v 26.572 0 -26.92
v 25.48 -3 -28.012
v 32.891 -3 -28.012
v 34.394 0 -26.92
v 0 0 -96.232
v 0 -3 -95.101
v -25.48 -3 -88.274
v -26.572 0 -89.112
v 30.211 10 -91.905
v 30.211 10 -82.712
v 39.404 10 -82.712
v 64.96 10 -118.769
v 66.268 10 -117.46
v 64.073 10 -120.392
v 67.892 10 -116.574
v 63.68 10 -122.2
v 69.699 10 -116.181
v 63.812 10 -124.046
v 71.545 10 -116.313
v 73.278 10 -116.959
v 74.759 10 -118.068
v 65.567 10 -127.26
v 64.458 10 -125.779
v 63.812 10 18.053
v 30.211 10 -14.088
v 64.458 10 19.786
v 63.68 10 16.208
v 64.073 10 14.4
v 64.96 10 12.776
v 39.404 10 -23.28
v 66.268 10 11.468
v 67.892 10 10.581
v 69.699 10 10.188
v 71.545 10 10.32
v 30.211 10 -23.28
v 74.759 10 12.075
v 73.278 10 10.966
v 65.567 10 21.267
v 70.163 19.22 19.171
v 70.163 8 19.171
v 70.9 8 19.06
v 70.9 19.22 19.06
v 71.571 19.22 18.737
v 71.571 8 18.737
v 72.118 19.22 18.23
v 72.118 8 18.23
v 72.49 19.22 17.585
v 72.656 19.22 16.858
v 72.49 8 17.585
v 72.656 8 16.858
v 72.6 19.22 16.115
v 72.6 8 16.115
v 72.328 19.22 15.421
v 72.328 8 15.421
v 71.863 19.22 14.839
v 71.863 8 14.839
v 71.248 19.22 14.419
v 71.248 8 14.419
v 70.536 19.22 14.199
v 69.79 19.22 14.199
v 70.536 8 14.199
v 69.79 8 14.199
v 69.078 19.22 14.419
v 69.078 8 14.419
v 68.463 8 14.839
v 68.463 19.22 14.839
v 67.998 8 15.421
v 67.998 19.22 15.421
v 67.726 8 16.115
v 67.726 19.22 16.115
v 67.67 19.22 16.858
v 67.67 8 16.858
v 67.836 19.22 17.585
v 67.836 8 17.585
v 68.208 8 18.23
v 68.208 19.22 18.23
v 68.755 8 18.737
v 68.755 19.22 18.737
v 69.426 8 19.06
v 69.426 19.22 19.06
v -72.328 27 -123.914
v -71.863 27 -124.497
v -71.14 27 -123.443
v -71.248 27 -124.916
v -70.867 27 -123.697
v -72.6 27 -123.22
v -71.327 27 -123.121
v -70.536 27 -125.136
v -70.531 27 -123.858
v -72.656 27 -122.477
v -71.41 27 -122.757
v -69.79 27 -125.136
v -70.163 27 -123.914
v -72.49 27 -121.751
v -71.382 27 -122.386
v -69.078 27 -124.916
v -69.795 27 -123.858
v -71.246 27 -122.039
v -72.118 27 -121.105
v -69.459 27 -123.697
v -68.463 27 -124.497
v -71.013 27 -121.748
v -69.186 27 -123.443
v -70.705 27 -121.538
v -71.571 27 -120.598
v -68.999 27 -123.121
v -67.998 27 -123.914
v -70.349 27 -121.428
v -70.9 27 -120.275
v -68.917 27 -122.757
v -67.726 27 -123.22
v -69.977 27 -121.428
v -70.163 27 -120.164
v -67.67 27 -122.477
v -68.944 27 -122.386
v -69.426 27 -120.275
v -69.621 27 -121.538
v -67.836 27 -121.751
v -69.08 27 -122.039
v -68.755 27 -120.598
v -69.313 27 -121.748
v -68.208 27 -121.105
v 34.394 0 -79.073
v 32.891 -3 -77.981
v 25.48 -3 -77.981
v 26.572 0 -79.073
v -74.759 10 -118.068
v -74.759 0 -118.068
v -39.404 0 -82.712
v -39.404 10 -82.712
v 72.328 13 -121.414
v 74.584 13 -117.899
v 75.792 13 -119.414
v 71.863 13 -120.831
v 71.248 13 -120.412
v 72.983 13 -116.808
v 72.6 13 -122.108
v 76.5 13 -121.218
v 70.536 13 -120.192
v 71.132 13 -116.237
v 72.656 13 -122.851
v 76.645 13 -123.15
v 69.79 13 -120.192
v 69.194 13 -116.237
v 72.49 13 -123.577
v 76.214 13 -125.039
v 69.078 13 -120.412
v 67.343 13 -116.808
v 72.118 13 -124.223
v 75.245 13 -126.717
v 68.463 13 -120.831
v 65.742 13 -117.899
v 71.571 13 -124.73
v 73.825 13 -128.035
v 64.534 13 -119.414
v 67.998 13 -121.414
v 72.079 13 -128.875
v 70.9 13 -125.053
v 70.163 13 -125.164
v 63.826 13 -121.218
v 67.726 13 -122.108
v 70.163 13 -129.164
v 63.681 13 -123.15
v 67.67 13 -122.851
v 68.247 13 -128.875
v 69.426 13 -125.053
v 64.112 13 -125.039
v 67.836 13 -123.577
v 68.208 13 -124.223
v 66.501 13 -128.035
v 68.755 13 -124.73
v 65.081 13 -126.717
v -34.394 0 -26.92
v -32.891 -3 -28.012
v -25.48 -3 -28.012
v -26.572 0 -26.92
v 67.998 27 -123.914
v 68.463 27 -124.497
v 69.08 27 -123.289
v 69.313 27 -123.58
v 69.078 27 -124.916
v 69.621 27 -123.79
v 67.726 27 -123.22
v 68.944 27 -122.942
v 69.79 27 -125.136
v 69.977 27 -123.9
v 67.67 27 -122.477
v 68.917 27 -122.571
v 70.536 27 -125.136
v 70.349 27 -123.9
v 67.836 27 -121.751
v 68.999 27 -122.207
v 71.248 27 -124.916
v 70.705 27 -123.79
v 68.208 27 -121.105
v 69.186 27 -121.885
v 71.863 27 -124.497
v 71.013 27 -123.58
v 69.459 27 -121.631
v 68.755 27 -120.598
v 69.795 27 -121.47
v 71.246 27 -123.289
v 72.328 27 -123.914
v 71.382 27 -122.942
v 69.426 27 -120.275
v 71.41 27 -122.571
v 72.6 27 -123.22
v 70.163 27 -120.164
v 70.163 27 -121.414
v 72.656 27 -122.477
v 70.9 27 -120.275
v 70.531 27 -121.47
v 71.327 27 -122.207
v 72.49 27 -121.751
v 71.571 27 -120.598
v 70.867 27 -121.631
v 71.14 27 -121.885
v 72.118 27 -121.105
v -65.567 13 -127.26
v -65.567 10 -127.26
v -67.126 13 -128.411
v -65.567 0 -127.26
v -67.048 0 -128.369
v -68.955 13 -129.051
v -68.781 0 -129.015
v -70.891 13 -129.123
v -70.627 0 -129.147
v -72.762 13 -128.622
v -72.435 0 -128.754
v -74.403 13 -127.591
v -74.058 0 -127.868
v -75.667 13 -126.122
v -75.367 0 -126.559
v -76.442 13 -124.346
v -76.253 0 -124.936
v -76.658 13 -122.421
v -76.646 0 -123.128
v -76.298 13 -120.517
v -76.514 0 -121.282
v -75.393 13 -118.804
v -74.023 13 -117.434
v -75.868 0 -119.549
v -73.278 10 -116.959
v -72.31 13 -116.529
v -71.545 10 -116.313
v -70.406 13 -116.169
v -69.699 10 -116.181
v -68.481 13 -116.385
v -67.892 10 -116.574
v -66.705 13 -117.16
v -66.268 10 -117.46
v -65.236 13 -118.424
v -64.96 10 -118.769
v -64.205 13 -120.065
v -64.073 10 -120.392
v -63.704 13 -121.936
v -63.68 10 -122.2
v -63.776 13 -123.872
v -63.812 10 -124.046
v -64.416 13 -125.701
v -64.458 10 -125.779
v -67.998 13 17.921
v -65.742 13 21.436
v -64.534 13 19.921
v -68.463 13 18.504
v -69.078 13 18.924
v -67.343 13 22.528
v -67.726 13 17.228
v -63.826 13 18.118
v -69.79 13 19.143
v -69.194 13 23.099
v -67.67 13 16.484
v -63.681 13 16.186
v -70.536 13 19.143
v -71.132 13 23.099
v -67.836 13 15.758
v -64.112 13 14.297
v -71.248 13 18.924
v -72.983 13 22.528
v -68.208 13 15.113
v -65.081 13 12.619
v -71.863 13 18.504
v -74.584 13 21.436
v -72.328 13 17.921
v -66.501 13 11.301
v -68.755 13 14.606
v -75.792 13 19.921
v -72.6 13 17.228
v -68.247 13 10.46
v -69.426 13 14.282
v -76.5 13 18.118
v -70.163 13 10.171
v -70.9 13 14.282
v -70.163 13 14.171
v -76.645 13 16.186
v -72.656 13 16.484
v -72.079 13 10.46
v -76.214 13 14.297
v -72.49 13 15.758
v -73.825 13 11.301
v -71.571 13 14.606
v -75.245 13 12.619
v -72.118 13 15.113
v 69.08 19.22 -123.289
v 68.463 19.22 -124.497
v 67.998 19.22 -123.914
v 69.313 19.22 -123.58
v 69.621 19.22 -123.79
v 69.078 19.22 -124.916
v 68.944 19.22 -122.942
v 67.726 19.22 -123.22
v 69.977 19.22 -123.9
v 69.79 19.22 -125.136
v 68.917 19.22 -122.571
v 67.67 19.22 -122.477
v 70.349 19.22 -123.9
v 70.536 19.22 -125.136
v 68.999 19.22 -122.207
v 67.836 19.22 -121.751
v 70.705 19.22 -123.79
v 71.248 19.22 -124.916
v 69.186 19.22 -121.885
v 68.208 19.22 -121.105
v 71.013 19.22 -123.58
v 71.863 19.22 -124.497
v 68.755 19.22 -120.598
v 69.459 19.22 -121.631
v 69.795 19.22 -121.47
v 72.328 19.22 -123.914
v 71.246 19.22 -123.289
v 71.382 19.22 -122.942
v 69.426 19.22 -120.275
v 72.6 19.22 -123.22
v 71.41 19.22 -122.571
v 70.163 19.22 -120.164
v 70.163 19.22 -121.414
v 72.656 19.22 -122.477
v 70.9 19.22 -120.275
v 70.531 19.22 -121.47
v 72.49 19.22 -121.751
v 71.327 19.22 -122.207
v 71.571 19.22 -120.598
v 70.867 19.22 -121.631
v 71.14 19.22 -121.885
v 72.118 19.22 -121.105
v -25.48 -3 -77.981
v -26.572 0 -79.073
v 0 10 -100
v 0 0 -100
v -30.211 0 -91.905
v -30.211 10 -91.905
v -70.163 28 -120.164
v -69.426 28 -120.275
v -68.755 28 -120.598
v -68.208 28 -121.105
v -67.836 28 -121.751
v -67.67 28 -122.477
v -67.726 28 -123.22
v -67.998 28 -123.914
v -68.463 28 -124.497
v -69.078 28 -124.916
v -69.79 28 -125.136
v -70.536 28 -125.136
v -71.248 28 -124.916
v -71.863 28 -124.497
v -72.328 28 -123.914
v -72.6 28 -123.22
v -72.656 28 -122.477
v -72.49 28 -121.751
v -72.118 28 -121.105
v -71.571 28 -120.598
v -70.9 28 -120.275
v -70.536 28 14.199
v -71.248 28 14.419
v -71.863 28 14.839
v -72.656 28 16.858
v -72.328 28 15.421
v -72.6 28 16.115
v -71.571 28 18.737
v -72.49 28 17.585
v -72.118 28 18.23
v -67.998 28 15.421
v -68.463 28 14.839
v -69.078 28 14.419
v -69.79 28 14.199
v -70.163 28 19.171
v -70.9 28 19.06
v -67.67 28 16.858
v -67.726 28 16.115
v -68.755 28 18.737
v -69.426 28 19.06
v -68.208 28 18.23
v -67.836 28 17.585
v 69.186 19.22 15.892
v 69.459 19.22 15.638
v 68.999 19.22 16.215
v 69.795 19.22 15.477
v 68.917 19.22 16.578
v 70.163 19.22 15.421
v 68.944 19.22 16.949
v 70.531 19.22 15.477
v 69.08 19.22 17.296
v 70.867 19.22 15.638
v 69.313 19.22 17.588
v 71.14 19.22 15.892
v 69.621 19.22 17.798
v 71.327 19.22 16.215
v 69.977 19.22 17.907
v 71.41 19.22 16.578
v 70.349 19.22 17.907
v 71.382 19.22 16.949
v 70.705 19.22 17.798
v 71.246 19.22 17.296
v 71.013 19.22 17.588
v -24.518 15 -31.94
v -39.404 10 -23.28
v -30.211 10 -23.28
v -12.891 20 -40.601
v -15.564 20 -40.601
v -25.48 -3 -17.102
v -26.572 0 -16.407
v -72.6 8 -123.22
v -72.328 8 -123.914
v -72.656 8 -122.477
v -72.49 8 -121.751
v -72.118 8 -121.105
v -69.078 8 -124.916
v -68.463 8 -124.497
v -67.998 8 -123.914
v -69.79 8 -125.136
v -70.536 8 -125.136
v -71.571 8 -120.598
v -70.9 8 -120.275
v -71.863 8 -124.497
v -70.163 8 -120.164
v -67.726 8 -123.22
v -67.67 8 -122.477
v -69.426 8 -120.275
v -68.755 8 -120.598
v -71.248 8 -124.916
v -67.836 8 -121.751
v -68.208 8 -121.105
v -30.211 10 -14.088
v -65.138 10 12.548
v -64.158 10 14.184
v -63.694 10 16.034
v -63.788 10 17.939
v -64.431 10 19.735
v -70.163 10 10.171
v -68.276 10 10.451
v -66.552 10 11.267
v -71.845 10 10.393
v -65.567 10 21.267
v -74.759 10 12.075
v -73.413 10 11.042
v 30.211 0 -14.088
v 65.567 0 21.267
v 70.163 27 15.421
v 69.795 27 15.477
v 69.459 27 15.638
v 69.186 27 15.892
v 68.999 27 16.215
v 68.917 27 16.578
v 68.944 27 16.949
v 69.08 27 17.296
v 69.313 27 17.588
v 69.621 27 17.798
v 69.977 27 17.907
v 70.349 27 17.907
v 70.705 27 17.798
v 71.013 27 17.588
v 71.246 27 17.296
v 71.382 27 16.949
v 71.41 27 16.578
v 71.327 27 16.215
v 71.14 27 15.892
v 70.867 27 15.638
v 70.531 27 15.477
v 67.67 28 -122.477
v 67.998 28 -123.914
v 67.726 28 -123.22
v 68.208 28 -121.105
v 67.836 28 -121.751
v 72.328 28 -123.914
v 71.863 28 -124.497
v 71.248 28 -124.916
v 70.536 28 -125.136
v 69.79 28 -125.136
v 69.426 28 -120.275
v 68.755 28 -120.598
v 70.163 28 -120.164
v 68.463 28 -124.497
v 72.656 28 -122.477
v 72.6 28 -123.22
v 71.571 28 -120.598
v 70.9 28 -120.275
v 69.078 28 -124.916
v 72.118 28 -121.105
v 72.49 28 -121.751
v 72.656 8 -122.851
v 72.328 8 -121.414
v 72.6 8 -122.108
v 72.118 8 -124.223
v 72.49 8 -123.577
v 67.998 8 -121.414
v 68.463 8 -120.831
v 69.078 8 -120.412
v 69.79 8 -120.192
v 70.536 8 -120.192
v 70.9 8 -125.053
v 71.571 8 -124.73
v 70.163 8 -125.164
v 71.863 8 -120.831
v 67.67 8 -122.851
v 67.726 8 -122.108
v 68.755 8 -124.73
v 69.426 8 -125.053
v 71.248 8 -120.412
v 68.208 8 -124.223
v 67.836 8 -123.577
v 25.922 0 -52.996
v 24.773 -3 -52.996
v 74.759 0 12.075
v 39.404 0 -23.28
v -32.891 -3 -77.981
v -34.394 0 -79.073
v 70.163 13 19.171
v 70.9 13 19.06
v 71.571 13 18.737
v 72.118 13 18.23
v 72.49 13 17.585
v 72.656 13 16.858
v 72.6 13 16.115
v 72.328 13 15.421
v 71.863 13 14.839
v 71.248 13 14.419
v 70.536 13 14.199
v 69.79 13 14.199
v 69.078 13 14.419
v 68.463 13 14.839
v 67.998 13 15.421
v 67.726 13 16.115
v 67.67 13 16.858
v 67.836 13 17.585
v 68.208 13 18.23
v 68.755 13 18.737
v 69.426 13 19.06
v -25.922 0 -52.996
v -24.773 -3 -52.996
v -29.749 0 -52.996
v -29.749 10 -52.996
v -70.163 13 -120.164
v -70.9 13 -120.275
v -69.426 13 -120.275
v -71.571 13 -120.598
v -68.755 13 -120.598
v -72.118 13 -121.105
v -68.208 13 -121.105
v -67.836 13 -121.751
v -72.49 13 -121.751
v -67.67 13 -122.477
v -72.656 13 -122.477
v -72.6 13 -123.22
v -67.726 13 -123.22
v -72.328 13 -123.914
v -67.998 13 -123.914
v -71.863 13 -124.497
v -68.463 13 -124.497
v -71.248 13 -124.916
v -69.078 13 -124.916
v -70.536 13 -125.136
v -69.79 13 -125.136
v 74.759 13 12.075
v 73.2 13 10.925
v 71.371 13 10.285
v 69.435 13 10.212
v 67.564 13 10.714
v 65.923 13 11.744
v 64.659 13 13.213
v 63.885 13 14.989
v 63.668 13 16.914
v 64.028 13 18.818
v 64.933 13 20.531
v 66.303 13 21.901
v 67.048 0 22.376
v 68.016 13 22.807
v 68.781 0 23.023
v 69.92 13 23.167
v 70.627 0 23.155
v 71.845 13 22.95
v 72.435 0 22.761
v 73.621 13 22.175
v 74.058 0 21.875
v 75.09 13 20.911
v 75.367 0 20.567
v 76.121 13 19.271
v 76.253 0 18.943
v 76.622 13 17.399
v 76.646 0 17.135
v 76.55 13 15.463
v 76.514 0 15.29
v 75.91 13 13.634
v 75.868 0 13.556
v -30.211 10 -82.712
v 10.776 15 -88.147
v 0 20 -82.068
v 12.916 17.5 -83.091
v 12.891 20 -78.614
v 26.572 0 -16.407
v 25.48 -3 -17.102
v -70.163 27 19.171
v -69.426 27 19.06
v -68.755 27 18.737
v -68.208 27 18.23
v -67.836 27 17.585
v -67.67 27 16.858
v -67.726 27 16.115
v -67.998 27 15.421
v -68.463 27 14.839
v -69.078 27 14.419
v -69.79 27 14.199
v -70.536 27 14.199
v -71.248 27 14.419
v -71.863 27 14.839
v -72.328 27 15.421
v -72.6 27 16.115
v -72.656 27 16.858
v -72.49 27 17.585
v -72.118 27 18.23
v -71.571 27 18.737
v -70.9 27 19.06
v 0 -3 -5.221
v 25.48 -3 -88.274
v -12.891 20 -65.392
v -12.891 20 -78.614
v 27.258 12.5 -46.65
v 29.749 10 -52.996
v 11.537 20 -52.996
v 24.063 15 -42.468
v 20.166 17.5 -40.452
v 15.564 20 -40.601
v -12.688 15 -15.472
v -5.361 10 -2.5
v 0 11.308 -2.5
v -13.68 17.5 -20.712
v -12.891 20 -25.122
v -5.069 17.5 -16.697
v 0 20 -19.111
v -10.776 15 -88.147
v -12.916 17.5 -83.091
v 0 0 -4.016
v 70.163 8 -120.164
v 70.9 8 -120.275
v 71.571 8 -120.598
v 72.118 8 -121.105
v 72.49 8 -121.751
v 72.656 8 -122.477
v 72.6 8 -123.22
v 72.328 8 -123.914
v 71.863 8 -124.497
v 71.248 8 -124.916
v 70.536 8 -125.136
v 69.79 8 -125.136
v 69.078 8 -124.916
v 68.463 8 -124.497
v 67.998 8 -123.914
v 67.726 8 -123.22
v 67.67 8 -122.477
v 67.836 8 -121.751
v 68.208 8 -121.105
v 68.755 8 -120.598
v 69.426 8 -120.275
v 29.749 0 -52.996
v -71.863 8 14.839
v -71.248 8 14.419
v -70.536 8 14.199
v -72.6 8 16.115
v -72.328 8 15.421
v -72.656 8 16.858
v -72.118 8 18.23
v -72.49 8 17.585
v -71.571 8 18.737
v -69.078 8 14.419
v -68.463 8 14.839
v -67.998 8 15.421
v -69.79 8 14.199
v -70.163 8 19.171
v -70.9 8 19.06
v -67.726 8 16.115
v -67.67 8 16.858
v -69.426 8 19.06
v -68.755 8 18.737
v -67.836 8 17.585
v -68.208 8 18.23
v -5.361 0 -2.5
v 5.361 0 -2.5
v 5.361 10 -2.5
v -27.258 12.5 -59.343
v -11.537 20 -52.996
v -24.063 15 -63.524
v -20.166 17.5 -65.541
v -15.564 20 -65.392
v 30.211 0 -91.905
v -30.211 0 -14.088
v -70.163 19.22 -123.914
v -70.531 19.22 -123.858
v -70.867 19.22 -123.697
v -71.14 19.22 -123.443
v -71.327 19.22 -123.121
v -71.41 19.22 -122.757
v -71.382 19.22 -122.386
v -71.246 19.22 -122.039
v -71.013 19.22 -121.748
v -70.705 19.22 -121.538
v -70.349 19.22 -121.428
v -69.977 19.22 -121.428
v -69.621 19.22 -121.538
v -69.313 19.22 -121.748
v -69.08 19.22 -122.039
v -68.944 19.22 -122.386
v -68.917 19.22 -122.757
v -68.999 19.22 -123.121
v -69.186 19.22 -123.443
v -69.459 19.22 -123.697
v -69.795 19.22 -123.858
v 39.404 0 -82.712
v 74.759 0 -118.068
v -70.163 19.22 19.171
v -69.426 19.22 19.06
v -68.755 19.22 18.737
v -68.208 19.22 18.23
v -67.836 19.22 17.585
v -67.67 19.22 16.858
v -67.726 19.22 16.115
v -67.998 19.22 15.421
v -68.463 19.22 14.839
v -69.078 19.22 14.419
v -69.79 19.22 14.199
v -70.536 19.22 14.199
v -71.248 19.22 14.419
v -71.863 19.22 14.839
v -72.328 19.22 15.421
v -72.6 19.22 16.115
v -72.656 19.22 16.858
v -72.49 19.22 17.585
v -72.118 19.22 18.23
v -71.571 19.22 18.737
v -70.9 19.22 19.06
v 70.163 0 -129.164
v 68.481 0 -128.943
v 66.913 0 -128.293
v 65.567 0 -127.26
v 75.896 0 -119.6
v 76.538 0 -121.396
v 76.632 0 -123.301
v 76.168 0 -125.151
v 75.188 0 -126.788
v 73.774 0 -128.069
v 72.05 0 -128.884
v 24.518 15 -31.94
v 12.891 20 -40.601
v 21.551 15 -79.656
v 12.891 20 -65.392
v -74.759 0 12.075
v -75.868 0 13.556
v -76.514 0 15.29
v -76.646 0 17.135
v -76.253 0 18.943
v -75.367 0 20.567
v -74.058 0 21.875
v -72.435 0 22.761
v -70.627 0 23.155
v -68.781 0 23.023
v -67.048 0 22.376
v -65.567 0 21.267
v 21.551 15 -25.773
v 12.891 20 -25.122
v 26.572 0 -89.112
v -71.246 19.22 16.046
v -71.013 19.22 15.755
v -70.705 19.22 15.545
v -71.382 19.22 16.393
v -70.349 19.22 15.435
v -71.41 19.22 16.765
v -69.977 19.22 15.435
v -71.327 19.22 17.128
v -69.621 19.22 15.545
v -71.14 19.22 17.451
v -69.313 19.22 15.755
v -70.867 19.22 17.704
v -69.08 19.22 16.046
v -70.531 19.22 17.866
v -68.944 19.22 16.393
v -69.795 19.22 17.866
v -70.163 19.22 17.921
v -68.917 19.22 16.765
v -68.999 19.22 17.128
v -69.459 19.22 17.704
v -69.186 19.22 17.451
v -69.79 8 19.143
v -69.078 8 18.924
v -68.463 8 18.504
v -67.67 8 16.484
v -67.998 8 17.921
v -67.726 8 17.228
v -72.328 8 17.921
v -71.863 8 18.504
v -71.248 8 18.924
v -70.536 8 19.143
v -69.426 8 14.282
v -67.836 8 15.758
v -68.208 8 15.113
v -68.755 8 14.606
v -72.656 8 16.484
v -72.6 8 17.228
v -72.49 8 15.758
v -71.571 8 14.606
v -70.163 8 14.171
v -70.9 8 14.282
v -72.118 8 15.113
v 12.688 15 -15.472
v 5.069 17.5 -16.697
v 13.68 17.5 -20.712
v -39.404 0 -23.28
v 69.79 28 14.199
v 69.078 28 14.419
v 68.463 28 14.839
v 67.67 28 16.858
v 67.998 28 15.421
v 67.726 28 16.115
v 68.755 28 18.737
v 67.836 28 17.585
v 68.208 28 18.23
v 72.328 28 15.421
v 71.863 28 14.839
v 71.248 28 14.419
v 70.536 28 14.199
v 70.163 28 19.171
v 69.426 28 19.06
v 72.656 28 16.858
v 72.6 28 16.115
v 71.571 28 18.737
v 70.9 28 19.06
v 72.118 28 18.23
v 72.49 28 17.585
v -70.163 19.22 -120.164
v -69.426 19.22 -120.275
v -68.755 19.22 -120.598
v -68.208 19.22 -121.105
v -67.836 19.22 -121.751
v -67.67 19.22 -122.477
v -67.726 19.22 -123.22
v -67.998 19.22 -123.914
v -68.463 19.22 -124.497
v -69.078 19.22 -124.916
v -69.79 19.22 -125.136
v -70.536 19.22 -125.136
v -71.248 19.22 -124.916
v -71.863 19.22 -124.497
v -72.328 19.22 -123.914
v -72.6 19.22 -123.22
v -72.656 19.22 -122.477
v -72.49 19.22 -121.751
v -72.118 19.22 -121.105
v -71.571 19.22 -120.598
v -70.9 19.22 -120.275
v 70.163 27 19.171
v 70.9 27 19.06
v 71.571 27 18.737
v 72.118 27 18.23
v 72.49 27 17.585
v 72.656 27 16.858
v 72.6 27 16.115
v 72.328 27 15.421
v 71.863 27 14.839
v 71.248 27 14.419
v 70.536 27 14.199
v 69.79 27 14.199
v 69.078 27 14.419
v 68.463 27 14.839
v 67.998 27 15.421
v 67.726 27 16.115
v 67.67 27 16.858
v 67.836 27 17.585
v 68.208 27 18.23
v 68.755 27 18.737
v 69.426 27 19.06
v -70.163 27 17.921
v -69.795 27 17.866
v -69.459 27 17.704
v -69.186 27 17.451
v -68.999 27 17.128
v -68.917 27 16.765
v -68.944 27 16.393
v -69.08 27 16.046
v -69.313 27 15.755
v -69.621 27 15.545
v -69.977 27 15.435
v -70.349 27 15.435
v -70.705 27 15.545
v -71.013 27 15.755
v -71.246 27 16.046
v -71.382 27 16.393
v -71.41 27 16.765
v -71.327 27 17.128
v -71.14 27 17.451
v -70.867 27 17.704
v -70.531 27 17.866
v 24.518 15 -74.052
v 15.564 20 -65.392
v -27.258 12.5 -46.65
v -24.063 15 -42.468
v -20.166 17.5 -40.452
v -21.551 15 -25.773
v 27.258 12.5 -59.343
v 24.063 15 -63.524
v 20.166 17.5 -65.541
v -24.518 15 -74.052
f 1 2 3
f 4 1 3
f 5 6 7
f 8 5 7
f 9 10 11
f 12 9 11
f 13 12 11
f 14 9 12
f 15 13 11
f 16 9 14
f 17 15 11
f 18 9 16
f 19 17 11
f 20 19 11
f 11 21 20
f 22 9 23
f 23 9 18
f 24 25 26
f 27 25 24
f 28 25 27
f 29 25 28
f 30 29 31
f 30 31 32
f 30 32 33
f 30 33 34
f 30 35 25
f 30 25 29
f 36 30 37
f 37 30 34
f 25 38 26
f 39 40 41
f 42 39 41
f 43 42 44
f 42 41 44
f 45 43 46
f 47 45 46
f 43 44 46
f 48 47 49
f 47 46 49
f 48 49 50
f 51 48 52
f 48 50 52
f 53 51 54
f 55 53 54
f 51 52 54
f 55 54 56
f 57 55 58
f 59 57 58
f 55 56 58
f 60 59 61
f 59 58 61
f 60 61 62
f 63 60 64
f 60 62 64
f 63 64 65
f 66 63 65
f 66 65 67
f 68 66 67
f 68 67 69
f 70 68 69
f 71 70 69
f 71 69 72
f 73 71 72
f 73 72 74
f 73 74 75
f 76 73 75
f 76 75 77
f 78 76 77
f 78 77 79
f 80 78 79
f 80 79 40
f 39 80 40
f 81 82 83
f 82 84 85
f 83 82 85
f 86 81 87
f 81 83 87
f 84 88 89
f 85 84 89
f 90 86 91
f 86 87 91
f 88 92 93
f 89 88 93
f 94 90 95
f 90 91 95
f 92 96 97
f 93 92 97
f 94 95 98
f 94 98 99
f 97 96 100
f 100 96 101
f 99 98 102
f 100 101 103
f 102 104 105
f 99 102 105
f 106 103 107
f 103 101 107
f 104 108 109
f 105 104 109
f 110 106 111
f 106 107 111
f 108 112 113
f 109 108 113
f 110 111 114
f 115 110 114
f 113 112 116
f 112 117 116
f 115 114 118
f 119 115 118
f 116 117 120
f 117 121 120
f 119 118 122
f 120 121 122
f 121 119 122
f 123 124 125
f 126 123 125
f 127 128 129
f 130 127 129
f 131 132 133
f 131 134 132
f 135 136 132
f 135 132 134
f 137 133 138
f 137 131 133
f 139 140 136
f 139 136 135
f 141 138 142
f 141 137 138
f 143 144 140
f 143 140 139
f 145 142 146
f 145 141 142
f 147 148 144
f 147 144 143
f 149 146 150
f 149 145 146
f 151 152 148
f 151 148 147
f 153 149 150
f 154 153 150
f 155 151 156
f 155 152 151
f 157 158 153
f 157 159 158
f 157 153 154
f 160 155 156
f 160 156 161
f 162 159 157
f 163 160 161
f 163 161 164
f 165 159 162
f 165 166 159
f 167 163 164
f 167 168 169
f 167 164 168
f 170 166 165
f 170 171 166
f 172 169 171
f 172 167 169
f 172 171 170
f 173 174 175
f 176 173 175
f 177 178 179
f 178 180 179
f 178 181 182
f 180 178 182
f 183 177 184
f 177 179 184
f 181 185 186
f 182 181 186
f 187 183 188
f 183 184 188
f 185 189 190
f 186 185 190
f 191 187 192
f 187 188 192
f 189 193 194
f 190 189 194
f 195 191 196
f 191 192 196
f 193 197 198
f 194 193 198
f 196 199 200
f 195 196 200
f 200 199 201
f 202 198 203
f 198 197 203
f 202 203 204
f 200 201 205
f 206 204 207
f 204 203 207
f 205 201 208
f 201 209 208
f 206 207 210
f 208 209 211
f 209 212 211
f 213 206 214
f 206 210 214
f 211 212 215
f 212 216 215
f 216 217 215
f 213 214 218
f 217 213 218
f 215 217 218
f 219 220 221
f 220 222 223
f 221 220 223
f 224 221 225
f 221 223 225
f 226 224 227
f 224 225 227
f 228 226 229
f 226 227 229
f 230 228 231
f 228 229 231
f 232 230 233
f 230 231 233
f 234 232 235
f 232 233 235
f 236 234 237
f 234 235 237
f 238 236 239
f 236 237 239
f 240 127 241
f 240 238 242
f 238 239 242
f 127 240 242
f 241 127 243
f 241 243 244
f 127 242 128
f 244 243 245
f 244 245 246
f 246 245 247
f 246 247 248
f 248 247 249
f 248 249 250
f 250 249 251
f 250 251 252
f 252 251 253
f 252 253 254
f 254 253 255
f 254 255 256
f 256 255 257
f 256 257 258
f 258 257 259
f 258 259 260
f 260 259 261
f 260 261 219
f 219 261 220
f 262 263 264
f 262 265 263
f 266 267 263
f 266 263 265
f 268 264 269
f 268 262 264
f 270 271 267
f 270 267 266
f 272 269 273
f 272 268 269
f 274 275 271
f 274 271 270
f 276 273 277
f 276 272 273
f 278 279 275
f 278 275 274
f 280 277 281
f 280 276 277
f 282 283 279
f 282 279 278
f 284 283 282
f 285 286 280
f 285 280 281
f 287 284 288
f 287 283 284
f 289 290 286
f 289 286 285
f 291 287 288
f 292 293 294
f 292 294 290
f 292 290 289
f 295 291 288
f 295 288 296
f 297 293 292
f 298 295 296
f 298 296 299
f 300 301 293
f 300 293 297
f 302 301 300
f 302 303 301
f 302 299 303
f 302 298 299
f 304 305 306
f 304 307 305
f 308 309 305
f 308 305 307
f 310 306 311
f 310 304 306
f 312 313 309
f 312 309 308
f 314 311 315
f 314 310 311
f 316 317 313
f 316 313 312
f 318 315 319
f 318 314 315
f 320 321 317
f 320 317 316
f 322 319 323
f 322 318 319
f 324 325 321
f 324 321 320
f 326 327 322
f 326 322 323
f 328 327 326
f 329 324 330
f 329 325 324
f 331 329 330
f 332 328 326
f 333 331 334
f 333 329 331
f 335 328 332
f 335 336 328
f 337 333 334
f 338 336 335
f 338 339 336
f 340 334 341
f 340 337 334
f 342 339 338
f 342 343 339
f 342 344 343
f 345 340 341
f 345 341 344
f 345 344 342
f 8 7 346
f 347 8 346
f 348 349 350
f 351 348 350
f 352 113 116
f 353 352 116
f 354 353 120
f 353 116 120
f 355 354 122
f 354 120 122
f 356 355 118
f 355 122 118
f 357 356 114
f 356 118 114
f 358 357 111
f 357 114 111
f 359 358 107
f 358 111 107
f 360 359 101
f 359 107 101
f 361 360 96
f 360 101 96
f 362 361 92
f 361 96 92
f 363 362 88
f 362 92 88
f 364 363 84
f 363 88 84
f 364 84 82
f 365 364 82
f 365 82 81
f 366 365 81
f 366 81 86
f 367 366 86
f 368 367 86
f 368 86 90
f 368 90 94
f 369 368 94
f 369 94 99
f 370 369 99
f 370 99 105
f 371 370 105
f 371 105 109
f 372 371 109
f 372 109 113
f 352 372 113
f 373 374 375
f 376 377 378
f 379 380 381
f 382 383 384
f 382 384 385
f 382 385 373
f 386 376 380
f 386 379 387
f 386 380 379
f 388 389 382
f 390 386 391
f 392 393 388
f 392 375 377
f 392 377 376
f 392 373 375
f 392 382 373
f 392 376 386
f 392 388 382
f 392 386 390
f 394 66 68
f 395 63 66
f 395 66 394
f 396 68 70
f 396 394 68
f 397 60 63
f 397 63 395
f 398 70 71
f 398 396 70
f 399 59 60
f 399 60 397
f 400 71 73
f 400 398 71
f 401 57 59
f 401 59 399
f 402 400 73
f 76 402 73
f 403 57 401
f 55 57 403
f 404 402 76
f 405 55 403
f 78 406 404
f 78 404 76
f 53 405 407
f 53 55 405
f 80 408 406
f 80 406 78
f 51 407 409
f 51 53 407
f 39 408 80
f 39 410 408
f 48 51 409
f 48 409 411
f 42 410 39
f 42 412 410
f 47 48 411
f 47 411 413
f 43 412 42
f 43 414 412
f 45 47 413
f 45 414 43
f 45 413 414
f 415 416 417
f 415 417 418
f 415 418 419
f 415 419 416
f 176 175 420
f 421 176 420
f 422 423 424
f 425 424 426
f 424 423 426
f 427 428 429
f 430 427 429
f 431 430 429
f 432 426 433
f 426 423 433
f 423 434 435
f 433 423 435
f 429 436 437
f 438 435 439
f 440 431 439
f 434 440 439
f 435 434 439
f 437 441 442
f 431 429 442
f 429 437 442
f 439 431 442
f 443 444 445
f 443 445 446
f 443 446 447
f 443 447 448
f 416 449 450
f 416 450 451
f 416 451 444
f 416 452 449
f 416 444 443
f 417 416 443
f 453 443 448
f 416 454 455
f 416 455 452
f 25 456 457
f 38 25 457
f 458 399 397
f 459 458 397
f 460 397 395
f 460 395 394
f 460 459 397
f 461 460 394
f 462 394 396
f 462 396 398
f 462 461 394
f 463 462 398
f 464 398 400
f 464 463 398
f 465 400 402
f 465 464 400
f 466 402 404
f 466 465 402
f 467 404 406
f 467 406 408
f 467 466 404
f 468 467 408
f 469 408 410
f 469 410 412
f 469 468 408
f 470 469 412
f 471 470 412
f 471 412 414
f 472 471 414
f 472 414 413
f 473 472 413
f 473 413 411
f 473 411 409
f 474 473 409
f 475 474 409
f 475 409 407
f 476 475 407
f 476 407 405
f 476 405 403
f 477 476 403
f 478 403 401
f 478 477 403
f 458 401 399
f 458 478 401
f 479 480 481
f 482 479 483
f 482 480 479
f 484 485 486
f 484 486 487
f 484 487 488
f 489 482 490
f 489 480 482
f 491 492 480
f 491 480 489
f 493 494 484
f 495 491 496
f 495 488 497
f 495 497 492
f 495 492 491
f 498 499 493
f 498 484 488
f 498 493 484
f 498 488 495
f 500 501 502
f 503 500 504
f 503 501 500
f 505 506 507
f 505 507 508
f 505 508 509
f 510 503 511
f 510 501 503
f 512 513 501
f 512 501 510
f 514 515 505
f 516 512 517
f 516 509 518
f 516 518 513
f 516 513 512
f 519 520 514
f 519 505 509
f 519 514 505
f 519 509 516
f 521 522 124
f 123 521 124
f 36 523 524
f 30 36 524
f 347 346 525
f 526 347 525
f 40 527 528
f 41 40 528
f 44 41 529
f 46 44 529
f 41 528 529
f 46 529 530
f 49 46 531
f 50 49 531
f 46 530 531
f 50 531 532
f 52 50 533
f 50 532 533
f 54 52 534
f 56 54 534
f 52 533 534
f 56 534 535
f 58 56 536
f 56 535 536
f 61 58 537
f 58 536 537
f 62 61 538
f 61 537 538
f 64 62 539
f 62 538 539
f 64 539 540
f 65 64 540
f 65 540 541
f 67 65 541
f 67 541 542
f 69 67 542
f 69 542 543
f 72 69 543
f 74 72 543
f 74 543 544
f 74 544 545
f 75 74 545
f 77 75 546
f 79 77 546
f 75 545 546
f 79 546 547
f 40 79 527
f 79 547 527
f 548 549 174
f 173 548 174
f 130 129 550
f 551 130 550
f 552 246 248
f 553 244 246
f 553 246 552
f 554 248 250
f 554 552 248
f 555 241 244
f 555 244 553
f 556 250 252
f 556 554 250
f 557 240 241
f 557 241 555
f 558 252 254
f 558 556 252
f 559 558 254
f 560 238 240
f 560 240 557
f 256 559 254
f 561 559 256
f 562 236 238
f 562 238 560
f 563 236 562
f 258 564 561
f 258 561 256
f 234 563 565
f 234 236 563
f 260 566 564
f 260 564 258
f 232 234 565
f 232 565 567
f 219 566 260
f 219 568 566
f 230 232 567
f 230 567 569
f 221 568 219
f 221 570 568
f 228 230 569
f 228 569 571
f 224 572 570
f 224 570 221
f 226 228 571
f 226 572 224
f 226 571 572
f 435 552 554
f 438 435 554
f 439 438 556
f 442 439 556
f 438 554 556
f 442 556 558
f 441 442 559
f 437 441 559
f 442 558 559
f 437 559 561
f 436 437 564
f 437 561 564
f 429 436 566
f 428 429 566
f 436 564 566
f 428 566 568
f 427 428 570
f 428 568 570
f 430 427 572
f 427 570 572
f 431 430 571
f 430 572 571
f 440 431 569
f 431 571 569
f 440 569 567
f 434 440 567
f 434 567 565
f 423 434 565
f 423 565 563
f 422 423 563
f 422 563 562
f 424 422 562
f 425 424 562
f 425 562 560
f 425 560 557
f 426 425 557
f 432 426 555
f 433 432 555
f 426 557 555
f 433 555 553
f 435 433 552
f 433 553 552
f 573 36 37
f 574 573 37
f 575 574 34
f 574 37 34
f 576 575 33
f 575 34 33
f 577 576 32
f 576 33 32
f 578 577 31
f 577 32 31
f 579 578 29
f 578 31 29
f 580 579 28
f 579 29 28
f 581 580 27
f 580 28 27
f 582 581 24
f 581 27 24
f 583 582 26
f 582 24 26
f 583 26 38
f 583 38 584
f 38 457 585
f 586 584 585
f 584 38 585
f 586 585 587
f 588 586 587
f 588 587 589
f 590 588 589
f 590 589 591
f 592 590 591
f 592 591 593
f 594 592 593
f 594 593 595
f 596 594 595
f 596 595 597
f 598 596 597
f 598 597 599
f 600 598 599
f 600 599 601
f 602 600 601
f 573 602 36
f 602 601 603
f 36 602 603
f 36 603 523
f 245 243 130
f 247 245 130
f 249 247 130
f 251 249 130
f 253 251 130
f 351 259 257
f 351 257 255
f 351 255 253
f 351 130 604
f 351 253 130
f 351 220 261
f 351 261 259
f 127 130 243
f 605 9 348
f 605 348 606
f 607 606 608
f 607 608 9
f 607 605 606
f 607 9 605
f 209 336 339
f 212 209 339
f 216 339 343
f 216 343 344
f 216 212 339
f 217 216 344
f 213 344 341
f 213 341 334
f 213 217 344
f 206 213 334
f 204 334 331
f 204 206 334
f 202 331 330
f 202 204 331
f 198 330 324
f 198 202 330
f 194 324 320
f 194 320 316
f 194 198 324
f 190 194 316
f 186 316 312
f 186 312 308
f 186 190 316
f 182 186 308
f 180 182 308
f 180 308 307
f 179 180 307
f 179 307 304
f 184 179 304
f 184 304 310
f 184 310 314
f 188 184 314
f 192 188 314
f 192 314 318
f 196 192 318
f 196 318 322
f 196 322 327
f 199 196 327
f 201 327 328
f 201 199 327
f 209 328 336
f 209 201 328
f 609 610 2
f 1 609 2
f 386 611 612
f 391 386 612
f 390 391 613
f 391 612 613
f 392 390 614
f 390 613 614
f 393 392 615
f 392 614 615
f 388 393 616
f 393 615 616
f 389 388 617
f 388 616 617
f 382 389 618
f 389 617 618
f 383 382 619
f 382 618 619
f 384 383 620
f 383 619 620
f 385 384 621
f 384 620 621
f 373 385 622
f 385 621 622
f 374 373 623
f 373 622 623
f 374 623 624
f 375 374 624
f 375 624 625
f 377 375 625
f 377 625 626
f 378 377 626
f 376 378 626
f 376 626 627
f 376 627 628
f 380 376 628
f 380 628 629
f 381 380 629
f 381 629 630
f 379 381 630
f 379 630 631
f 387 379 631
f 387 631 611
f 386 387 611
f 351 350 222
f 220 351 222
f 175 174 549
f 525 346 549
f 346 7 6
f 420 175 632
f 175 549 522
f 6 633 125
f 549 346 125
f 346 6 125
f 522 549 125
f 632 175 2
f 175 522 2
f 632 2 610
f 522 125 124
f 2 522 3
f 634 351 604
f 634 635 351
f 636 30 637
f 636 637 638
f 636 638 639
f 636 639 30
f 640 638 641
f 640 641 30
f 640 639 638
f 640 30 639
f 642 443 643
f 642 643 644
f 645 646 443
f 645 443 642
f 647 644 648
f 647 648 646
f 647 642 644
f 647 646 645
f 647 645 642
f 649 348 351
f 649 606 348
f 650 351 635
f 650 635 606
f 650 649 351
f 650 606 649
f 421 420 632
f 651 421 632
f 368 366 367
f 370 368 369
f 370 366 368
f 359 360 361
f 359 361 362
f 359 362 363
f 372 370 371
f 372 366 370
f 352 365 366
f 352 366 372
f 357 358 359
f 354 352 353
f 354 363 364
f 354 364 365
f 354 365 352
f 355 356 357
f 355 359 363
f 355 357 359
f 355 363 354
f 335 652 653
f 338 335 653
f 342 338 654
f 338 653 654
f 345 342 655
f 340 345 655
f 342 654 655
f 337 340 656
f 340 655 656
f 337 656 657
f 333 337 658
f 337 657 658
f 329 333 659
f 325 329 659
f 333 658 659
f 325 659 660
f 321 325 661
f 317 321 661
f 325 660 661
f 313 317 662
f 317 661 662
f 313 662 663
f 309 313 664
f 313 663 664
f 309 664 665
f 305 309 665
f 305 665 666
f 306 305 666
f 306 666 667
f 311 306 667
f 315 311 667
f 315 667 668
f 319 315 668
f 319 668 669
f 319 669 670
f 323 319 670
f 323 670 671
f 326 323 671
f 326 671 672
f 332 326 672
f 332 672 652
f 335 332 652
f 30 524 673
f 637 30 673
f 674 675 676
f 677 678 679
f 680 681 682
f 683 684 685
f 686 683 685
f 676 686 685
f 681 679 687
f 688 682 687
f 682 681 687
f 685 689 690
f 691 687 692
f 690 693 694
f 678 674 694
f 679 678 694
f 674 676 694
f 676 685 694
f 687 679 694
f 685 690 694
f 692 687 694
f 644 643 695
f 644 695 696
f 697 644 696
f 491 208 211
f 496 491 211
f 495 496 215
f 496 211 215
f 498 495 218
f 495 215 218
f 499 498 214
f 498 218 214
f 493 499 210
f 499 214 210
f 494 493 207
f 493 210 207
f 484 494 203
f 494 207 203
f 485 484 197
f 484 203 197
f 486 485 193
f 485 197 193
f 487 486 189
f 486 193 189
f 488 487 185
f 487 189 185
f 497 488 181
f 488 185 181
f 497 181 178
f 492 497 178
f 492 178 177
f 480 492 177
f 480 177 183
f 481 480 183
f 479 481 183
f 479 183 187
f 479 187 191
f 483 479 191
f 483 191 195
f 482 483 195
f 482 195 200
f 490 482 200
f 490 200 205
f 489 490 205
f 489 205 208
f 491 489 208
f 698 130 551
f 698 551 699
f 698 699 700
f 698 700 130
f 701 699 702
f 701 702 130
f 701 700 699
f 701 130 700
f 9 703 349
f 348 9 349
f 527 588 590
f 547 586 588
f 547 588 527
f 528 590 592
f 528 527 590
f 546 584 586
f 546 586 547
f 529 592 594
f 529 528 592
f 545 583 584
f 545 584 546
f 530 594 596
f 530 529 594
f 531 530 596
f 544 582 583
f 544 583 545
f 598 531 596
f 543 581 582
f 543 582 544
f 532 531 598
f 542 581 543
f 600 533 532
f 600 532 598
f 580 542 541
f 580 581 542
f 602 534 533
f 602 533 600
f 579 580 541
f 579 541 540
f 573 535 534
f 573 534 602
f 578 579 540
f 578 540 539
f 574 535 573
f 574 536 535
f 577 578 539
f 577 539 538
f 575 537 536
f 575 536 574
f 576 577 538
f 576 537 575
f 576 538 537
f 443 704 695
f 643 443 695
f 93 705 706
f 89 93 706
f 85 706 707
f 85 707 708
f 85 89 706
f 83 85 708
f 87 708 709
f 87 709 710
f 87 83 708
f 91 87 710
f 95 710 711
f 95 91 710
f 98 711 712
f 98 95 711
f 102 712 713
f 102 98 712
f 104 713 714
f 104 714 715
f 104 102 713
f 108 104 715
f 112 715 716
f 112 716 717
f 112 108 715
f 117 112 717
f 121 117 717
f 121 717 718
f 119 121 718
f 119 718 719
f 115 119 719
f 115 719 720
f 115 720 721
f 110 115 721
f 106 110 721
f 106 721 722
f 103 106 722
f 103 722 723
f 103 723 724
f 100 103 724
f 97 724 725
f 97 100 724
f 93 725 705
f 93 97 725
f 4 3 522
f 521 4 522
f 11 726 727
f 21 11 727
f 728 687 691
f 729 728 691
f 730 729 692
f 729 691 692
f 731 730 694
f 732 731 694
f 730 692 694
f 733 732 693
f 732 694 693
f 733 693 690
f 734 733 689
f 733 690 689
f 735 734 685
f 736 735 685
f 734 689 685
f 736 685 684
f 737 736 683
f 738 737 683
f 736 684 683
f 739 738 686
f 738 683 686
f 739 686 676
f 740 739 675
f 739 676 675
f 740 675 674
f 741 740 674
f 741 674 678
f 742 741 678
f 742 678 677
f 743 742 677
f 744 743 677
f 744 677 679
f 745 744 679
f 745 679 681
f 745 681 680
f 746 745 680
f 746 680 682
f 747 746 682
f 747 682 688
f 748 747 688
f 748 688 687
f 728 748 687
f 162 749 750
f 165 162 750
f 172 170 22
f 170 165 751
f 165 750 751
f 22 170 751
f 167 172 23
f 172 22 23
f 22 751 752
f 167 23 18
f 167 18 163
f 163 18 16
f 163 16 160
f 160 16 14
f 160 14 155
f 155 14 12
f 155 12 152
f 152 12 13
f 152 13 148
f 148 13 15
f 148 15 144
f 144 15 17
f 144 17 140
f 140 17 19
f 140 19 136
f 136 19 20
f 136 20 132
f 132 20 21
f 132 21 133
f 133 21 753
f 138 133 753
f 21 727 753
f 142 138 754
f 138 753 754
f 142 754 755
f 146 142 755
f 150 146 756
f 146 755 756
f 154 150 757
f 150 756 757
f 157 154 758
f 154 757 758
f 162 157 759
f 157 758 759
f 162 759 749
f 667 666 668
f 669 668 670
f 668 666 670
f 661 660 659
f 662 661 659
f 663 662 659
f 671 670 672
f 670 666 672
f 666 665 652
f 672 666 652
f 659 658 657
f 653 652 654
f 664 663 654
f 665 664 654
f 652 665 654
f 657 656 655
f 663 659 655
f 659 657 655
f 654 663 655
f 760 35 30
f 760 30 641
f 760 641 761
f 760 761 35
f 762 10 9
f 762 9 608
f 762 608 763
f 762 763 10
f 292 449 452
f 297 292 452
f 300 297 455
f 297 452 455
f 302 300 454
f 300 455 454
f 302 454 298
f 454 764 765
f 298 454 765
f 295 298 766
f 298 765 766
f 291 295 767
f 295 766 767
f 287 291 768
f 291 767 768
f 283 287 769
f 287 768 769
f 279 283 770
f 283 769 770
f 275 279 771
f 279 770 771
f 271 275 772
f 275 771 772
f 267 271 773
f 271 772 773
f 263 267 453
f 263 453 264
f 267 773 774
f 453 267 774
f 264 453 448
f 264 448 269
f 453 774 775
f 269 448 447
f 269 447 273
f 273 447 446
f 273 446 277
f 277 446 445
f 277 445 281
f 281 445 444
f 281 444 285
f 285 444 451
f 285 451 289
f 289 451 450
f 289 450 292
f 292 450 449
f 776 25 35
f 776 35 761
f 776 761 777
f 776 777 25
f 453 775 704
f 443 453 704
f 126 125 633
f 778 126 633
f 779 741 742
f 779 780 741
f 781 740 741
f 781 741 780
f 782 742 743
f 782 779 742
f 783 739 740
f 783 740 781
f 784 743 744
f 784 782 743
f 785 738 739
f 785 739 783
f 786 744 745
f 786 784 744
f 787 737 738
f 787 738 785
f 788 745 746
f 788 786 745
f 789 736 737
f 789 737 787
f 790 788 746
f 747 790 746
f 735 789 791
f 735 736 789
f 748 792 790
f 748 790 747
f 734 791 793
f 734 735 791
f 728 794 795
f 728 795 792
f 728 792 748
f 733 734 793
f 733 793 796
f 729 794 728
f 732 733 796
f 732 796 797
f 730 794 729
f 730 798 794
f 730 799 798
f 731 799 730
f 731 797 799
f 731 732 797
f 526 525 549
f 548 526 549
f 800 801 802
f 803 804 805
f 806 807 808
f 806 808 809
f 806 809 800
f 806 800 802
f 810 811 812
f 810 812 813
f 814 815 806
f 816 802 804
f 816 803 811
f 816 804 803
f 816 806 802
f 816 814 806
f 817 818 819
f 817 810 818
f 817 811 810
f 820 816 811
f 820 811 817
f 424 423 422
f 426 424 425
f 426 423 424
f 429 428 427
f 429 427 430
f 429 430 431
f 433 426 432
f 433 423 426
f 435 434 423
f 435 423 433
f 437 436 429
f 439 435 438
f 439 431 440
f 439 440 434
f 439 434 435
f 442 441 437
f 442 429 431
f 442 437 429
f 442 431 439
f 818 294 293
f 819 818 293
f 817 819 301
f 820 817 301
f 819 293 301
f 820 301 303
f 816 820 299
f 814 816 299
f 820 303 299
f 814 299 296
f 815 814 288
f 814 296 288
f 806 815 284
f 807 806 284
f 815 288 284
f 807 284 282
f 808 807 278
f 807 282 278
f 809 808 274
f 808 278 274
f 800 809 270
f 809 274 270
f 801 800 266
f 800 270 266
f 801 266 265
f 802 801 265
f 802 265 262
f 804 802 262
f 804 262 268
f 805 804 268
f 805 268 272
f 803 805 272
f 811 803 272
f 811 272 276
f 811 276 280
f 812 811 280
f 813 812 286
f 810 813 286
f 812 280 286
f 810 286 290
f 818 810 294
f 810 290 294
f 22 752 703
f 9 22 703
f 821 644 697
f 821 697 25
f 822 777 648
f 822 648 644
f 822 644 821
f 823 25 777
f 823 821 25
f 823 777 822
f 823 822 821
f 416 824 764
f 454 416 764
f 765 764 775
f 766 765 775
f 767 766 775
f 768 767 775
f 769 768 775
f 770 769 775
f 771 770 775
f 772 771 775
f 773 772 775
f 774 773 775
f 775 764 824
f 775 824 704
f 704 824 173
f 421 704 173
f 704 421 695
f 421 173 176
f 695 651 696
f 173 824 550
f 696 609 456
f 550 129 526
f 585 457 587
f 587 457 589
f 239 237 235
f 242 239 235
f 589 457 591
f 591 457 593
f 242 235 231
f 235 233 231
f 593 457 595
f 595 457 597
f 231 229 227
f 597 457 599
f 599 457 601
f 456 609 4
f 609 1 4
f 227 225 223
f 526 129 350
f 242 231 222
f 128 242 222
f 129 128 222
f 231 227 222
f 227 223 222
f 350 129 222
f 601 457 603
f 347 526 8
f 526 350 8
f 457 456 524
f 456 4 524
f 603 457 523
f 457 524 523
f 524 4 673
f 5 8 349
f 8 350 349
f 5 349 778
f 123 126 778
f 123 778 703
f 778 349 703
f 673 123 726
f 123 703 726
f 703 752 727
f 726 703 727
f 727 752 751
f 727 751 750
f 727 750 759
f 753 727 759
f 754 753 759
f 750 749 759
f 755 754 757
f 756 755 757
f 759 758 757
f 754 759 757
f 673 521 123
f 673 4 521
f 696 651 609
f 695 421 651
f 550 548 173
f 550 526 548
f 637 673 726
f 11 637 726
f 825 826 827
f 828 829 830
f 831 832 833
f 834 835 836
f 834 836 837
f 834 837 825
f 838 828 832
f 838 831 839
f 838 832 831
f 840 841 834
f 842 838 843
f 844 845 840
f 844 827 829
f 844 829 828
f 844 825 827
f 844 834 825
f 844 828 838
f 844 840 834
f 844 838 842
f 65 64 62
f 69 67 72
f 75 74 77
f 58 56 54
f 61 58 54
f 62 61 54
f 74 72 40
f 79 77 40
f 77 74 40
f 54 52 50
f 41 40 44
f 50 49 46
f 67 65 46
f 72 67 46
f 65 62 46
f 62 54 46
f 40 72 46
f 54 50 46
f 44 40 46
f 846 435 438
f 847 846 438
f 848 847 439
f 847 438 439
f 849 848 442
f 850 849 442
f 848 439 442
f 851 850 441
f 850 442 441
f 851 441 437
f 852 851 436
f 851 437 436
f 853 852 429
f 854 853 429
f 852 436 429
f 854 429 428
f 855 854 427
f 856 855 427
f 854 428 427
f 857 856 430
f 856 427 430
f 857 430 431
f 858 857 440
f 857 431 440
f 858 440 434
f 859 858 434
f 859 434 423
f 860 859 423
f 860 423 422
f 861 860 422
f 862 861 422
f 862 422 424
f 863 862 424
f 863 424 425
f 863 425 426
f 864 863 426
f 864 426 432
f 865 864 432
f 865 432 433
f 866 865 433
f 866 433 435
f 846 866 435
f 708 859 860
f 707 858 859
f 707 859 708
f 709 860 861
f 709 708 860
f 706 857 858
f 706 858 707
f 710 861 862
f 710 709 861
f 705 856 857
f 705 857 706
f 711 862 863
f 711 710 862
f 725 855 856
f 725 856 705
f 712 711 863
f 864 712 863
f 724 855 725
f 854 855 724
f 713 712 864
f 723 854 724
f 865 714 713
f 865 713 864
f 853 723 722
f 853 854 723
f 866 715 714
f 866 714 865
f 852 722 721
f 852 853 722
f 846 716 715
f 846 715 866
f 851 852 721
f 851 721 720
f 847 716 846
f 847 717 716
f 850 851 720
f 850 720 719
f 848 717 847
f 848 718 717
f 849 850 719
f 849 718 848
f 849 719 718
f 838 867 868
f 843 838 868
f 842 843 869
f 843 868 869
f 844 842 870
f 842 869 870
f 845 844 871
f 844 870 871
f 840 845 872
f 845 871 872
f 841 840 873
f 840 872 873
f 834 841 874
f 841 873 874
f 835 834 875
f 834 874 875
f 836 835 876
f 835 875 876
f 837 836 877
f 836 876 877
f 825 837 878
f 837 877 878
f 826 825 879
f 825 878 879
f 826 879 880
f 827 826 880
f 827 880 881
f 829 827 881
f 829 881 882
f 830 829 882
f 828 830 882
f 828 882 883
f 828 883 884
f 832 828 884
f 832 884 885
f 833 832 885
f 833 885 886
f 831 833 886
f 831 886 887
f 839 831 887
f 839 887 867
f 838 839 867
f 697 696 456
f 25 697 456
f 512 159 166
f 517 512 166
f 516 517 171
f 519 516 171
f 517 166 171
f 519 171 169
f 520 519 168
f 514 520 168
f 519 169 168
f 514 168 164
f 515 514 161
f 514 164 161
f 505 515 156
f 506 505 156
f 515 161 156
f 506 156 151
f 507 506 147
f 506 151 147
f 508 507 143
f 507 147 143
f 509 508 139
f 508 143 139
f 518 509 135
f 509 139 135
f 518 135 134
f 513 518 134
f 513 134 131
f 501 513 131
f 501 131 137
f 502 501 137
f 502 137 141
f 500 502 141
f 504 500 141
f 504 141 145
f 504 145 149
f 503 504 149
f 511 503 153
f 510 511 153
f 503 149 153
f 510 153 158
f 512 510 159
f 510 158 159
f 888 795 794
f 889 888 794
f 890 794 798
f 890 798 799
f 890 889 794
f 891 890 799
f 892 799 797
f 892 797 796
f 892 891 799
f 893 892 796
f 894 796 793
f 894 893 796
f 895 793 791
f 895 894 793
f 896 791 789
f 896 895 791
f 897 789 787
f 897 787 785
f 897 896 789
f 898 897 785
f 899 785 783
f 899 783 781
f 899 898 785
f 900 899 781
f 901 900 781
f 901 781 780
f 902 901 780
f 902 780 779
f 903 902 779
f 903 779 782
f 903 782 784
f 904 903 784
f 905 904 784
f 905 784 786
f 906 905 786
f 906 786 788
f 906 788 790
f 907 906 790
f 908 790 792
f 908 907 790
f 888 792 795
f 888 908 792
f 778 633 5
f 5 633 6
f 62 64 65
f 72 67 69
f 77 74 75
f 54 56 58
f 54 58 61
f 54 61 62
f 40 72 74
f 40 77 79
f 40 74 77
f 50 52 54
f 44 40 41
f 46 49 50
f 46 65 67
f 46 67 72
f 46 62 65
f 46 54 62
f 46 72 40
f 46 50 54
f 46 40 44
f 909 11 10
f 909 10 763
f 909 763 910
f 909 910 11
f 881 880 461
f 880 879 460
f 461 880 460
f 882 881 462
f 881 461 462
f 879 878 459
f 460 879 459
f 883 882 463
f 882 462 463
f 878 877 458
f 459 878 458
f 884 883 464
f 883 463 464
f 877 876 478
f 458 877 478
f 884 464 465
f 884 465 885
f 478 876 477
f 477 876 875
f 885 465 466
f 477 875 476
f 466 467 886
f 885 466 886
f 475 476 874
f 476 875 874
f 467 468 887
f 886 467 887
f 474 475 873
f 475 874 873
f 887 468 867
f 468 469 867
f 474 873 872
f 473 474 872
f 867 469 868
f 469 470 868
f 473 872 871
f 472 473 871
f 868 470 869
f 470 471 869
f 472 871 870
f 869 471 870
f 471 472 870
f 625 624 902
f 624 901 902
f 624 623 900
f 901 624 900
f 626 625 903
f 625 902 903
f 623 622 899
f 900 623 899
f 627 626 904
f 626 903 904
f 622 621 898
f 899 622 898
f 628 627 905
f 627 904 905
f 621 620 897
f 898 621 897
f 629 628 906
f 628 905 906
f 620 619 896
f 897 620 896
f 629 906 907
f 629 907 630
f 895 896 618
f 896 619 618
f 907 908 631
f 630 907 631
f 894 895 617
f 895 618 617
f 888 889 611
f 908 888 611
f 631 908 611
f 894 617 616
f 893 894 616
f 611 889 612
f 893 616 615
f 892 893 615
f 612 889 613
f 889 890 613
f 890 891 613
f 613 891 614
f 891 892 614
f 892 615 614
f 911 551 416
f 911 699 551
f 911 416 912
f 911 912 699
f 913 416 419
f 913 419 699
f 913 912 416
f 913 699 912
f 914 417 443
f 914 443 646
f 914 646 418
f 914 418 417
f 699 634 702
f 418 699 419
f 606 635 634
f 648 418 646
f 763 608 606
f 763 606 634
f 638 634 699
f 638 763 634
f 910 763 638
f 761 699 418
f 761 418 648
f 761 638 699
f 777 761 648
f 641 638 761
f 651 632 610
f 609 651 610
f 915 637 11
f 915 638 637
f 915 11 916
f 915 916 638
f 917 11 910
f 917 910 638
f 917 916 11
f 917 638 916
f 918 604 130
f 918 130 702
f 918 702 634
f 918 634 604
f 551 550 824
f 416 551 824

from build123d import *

# Parameters (mm, degrees)
SALIENTE_EXTRUIR1_DEPTH           = 10
SALIENTE_EXTRUIR2_DEPTH           = 13
SALIENTE_EXTRUIR2_TAPER           = 20
SALIENTE_EXTRUIR2_OTHER_WAY_DEPTH = 10
SALIENTE_EXTRUIR2_OTHER_WAY_TAPER = 60
CROQUIS8_W                        = 21.791142798
CROQUIS8_H                        = 20
CORTAR_EXTRUIR3_DEPTH             = 2.5
SALIENTE_EXTRUIR3_DEPTH           = 3
SALIENTE_EXTRUIR3_DEPTH_BACK      = 10
CROQUIS3_R                        = 6.5
CROQUIS4_R                        = 2.5
CORTAR_EXTRUIR1_DEPTH             = 5
CROQUIS6_R                        = 2.5
SALIENTE_EXTRUIR4_DEPTH           = 20
SALIENTE_EXTRUIR4_2_DEPTH         = 20
SALIENTE_EXTRUIR4_3_DEPTH         = 20
SALIENTE_EXTRUIR4_4_DEPTH         = 20
CORTAR_EXTRUIR2_START             = -1
CROQUIS7_R                        = 2.5
CROQUIS7_R_2                      = 1.25
CORTAR_EXTRUIR2_DEPTH             = 7.78
CROQUIS9_W                        = 10.722534602
CROQUIS9_H                        = 19.76388768
CORTAR_EXTRUIR5_DEPTH             = 10


with BuildPart() as part:
    # Croquis1 → Saliente-Extruir1 (new body)
    with BuildSketch(Plane(origin=(0, 0, 0), x_dir=(1, 0, 0), z_dir=(0, 1, 0))):
        Polygon((30.211490956, 91.904855396), (0, 100), (-30.211490956, 91.904855396), (-65.566830015, 127.260194456), (-74.759218171, 118.0678063), (-39.403879111, 82.712467241), (-29.748528135, 52.996352497), (-39.403879111, 23.280237752), (-74.759218171, -12.075101307), (-65.566830015, -21.267489462), (-30.211490956, 14.087849597), (0, 0), (30.211490956, 14.087849597), (65.566830015, -21.267489462), (74.759218171, -12.075101307), (39.403879111, 23.280237752), (29.748528135, 52.996352497), (39.403879111, 82.712467241), (74.759218171, 118.0678063), (65.566830015, 127.260194456), align=None)
    extrude(amount=SALIENTE_EXTRUIR1_DEPTH)

    # Croquis2 → Saliente-Extruir2 (add)
    with BuildSketch(Plane(origin=(0, 10, 0), x_dir=(1, 0, 0), z_dir=(0, 1, 0))):
        Polygon((-39.403879111, 82.712467241), (-29.748528135, 52.996352497), (-39.403879111, 23.280237752), (-30.211490956, 23.280237752), (-30.211490956, 14.087849597), (0, 0), (30.211490956, 14.087849597), (30.211490956, 23.280237752), (39.403879111, 23.280237752), (29.748528135, 52.996352497), (39.403879111, 82.712467241), (30.211490956, 82.712467241), (30.211490956, 91.904855396), (0, 100), (-30.211490956, 91.904855396), (-30.211490956, 82.712467241), align=None)
    extrude(amount=-SALIENTE_EXTRUIR2_DEPTH, taper=SALIENTE_EXTRUIR2_TAPER)

    # Croquis2 → Saliente-Extruir2 other way (add)
    with BuildSketch(Plane(origin=(0, 10, 0), x_dir=(1, 0, 0), z_dir=(0, 1, 0))):
        Polygon((-39.403879111, 82.712467241), (-29.748528135, 52.996352497), (-39.403879111, 23.280237752), (-30.211490956, 23.280237752), (-30.211490956, 14.087849597), (0, 0), (30.211490956, 14.087849597), (30.211490956, 23.280237752), (39.403879111, 23.280237752), (29.748528135, 52.996352497), (39.403879111, 82.712467241), (30.211490956, 82.712467241), (30.211490956, 91.904855396), (0, 100), (-30.211490956, 91.904855396), (-30.211490956, 82.712467241), align=None)
    extrude(amount=SALIENTE_EXTRUIR2_OTHER_WAY_DEPTH, taper=SALIENTE_EXTRUIR2_OTHER_WAY_TAPER)

    # Croquis8 → Cortar-Extruir3 (cut)
    with BuildSketch(Plane.XY):
        Rectangle(CROQUIS8_W, CROQUIS8_H)
    extrude(amount=-CORTAR_EXTRUIR3_DEPTH, mode=Mode.SUBTRACT)

    # Croquis3 → Saliente-Extruir3 (add, two sides: drawn at the far end of the back side and taken through both)
    with BuildSketch(Plane(origin=(0, 10, 0), x_dir=(1, 0, 0), z_dir=(0, 1, 0)).offset(-SALIENTE_EXTRUIR3_DEPTH_BACK)):
        with Locations(Location((70.163024093, -16.671295385, 0), (0, 0, 45))):
            Circle(CROQUIS3_R)
        with Locations(Location((-70.163024093, -16.671295385, 0), (0, 0, 90))):
            Circle(CROQUIS3_R)
        with Locations(Location((70.163024093, 122.664000378, 0), (0, 0, 90))):
            Circle(CROQUIS3_R)
        with Locations(Location((-70.163024093, 122.664000378, 0), (0, 0, 45))):
            Circle(CROQUIS3_R)
    extrude(amount=SALIENTE_EXTRUIR3_DEPTH + SALIENTE_EXTRUIR3_DEPTH_BACK)

    # Croquis4 → Cortar-Extruir1 (cut, symmetric)
    with BuildSketch(Plane(origin=(0, 13, 0), x_dir=(1, 0, 0), z_dir=(0, 1, 0))):
        with Locations(Location((70.163024093, -16.671295385, 0), (0, 0, 270))):
            Circle(CROQUIS4_R)
        with Locations(Location((-70.163024093, -16.671295385, 0), (0, 0, 90))):
            Circle(CROQUIS4_R)
        with Locations(Location((70.163024093, 122.664000378, 0), (0, 0, 90))):
            Circle(CROQUIS4_R)
        with Locations(Location((-70.163024093, 122.664000378, 0), (0, 0, 270))):
            Circle(CROQUIS4_R)
    extrude(amount=CORTAR_EXTRUIR1_DEPTH, both=True, mode=Mode.SUBTRACT)

    # Croquis9 → Cortar-Extruir5 (cut)
    with BuildSketch(Plane.XY.offset(-2.5)):
        with Locations((0, 5.082150096)):
            Rectangle(CROQUIS9_W, CROQUIS9_H)
    extrude(amount=CORTAR_EXTRUIR5_DEPTH, mode=Mode.SUBTRACT)


with BuildPart() as body_2:
    # Croquis6 → Saliente-Extruir4 (new body)
    with BuildSketch(Plane(origin=(0, 8, 0), x_dir=(1, 0, 0), z_dir=(0, 1, 0))):
        with Locations(Location((70.163024093, -16.671295385, 0), (0, 0, 270))):
            Circle(CROQUIS6_R)
    extrude(amount=SALIENTE_EXTRUIR4_DEPTH)


with BuildPart() as body_3:
    # Croquis6 → Saliente-Extruir4 2 (new body)
    with BuildSketch(Plane(origin=(0, 8, 0), x_dir=(1, 0, 0), z_dir=(0, 1, 0))):
        with Locations(Location((70.163024093, 122.664000378, 0), (0, 0, 270))):
            Circle(CROQUIS6_R)
    extrude(amount=SALIENTE_EXTRUIR4_2_DEPTH)


with BuildPart() as body_4:
    # Croquis6 → Saliente-Extruir4 3 (new body)
    with BuildSketch(Plane(origin=(0, 8, 0), x_dir=(1, 0, 0), z_dir=(0, 1, 0))):
        with Locations(Location((-70.163024093, 122.664000378, 0), (0, 0, 270))):
            Circle(CROQUIS6_R)
    extrude(amount=SALIENTE_EXTRUIR4_3_DEPTH)


with BuildPart() as body_5:
    # Croquis6 → Saliente-Extruir4 4 (new body)
    with BuildSketch(Plane(origin=(0, 8, 0), x_dir=(1, 0, 0), z_dir=(0, 1, 0))):
        with Locations(Location((-70.163024093, -16.671295385, 0), (0, 0, 270))):
            Circle(CROQUIS6_R)
    extrude(amount=SALIENTE_EXTRUIR4_4_DEPTH)


with BuildPart() as cortar_extruir2_tool:
    # Croquis7 → Cortar-Extruir2 (new body)
    # profile 1 of 4: a face of its own
    with BuildSketch(Plane(origin=(0, 28, 0), x_dir=(1, 0, 0), z_dir=(0, 1, 0)).offset(CORTAR_EXTRUIR2_START)):
        with Locations(Location((-70.163024093, 122.664000378, 0), (0, 0, 270))):
            Circle(CROQUIS7_R)
        with Locations(Location((-70.163024093, 122.664000378, 0), (0, 0, 90))):
            Circle(CROQUIS7_R_2, mode=Mode.SUBTRACT)
    # profile 2 of 4: a face of its own
    with BuildSketch(Plane(origin=(0, 28, 0), x_dir=(1, 0, 0), z_dir=(0, 1, 0)).offset(CORTAR_EXTRUIR2_START)):
        with Locations(Location((70.163024093, 122.664000378, 0), (0, 0, 270))):
            Circle(CROQUIS7_R)
        with Locations(Location((70.163024093, 122.664000378, 0), (0, 0, 270))):
            Circle(CROQUIS7_R_2, mode=Mode.SUBTRACT)
    # profile 3 of 4: a face of its own
    with BuildSketch(Plane(origin=(0, 28, 0), x_dir=(1, 0, 0), z_dir=(0, 1, 0)).offset(CORTAR_EXTRUIR2_START)):
        with Locations(Location((70.163024093, -16.671295385, 0), (0, 0, 270))):
            Circle(CROQUIS7_R)
        with Locations(Location((70.163024093, -16.671295385, 0), (0, 0, 90))):
            Circle(CROQUIS7_R_2, mode=Mode.SUBTRACT)
    # profile 4 of 4: a face of its own
    with BuildSketch(Plane(origin=(0, 28, 0), x_dir=(1, 0, 0), z_dir=(0, 1, 0)).offset(CORTAR_EXTRUIR2_START)):
        with Locations(Location((-70.163024093, -16.671295385, 0), (0, 0, 270))):
            Circle(CROQUIS7_R)
        with Locations(Location((-70.163024093, -16.671295385, 0), (0, 0, 270))):
            Circle(CROQUIS7_R_2, mode=Mode.SUBTRACT)
    extrude(amount=-CORTAR_EXTRUIR2_DEPTH)


with BuildPart() as body_2_1:
    add(body_2.part)

    # Cortar-Extruir2: cut by cortar_extruir2_tool
    add(cortar_extruir2_tool.part, mode=Mode.SUBTRACT)


with BuildPart() as body_3_1:
    add(body_3.part)

    # Cortar-Extruir2: cut by cortar_extruir2_tool
    add(cortar_extruir2_tool.part, mode=Mode.SUBTRACT)


with BuildPart() as body_4_1:
    add(body_4.part)

    # Cortar-Extruir2: cut by cortar_extruir2_tool
    add(cortar_extruir2_tool.part, mode=Mode.SUBTRACT)


with BuildPart() as body_5_1:
    add(body_5.part)

    # Cortar-Extruir2: cut by cortar_extruir2_tool
    add(cortar_extruir2_tool.part, mode=Mode.SUBTRACT)


solid = Compound([part.part, body_2_1.part, body_3_1.part, body_4_1.part, body_5_1.part])
